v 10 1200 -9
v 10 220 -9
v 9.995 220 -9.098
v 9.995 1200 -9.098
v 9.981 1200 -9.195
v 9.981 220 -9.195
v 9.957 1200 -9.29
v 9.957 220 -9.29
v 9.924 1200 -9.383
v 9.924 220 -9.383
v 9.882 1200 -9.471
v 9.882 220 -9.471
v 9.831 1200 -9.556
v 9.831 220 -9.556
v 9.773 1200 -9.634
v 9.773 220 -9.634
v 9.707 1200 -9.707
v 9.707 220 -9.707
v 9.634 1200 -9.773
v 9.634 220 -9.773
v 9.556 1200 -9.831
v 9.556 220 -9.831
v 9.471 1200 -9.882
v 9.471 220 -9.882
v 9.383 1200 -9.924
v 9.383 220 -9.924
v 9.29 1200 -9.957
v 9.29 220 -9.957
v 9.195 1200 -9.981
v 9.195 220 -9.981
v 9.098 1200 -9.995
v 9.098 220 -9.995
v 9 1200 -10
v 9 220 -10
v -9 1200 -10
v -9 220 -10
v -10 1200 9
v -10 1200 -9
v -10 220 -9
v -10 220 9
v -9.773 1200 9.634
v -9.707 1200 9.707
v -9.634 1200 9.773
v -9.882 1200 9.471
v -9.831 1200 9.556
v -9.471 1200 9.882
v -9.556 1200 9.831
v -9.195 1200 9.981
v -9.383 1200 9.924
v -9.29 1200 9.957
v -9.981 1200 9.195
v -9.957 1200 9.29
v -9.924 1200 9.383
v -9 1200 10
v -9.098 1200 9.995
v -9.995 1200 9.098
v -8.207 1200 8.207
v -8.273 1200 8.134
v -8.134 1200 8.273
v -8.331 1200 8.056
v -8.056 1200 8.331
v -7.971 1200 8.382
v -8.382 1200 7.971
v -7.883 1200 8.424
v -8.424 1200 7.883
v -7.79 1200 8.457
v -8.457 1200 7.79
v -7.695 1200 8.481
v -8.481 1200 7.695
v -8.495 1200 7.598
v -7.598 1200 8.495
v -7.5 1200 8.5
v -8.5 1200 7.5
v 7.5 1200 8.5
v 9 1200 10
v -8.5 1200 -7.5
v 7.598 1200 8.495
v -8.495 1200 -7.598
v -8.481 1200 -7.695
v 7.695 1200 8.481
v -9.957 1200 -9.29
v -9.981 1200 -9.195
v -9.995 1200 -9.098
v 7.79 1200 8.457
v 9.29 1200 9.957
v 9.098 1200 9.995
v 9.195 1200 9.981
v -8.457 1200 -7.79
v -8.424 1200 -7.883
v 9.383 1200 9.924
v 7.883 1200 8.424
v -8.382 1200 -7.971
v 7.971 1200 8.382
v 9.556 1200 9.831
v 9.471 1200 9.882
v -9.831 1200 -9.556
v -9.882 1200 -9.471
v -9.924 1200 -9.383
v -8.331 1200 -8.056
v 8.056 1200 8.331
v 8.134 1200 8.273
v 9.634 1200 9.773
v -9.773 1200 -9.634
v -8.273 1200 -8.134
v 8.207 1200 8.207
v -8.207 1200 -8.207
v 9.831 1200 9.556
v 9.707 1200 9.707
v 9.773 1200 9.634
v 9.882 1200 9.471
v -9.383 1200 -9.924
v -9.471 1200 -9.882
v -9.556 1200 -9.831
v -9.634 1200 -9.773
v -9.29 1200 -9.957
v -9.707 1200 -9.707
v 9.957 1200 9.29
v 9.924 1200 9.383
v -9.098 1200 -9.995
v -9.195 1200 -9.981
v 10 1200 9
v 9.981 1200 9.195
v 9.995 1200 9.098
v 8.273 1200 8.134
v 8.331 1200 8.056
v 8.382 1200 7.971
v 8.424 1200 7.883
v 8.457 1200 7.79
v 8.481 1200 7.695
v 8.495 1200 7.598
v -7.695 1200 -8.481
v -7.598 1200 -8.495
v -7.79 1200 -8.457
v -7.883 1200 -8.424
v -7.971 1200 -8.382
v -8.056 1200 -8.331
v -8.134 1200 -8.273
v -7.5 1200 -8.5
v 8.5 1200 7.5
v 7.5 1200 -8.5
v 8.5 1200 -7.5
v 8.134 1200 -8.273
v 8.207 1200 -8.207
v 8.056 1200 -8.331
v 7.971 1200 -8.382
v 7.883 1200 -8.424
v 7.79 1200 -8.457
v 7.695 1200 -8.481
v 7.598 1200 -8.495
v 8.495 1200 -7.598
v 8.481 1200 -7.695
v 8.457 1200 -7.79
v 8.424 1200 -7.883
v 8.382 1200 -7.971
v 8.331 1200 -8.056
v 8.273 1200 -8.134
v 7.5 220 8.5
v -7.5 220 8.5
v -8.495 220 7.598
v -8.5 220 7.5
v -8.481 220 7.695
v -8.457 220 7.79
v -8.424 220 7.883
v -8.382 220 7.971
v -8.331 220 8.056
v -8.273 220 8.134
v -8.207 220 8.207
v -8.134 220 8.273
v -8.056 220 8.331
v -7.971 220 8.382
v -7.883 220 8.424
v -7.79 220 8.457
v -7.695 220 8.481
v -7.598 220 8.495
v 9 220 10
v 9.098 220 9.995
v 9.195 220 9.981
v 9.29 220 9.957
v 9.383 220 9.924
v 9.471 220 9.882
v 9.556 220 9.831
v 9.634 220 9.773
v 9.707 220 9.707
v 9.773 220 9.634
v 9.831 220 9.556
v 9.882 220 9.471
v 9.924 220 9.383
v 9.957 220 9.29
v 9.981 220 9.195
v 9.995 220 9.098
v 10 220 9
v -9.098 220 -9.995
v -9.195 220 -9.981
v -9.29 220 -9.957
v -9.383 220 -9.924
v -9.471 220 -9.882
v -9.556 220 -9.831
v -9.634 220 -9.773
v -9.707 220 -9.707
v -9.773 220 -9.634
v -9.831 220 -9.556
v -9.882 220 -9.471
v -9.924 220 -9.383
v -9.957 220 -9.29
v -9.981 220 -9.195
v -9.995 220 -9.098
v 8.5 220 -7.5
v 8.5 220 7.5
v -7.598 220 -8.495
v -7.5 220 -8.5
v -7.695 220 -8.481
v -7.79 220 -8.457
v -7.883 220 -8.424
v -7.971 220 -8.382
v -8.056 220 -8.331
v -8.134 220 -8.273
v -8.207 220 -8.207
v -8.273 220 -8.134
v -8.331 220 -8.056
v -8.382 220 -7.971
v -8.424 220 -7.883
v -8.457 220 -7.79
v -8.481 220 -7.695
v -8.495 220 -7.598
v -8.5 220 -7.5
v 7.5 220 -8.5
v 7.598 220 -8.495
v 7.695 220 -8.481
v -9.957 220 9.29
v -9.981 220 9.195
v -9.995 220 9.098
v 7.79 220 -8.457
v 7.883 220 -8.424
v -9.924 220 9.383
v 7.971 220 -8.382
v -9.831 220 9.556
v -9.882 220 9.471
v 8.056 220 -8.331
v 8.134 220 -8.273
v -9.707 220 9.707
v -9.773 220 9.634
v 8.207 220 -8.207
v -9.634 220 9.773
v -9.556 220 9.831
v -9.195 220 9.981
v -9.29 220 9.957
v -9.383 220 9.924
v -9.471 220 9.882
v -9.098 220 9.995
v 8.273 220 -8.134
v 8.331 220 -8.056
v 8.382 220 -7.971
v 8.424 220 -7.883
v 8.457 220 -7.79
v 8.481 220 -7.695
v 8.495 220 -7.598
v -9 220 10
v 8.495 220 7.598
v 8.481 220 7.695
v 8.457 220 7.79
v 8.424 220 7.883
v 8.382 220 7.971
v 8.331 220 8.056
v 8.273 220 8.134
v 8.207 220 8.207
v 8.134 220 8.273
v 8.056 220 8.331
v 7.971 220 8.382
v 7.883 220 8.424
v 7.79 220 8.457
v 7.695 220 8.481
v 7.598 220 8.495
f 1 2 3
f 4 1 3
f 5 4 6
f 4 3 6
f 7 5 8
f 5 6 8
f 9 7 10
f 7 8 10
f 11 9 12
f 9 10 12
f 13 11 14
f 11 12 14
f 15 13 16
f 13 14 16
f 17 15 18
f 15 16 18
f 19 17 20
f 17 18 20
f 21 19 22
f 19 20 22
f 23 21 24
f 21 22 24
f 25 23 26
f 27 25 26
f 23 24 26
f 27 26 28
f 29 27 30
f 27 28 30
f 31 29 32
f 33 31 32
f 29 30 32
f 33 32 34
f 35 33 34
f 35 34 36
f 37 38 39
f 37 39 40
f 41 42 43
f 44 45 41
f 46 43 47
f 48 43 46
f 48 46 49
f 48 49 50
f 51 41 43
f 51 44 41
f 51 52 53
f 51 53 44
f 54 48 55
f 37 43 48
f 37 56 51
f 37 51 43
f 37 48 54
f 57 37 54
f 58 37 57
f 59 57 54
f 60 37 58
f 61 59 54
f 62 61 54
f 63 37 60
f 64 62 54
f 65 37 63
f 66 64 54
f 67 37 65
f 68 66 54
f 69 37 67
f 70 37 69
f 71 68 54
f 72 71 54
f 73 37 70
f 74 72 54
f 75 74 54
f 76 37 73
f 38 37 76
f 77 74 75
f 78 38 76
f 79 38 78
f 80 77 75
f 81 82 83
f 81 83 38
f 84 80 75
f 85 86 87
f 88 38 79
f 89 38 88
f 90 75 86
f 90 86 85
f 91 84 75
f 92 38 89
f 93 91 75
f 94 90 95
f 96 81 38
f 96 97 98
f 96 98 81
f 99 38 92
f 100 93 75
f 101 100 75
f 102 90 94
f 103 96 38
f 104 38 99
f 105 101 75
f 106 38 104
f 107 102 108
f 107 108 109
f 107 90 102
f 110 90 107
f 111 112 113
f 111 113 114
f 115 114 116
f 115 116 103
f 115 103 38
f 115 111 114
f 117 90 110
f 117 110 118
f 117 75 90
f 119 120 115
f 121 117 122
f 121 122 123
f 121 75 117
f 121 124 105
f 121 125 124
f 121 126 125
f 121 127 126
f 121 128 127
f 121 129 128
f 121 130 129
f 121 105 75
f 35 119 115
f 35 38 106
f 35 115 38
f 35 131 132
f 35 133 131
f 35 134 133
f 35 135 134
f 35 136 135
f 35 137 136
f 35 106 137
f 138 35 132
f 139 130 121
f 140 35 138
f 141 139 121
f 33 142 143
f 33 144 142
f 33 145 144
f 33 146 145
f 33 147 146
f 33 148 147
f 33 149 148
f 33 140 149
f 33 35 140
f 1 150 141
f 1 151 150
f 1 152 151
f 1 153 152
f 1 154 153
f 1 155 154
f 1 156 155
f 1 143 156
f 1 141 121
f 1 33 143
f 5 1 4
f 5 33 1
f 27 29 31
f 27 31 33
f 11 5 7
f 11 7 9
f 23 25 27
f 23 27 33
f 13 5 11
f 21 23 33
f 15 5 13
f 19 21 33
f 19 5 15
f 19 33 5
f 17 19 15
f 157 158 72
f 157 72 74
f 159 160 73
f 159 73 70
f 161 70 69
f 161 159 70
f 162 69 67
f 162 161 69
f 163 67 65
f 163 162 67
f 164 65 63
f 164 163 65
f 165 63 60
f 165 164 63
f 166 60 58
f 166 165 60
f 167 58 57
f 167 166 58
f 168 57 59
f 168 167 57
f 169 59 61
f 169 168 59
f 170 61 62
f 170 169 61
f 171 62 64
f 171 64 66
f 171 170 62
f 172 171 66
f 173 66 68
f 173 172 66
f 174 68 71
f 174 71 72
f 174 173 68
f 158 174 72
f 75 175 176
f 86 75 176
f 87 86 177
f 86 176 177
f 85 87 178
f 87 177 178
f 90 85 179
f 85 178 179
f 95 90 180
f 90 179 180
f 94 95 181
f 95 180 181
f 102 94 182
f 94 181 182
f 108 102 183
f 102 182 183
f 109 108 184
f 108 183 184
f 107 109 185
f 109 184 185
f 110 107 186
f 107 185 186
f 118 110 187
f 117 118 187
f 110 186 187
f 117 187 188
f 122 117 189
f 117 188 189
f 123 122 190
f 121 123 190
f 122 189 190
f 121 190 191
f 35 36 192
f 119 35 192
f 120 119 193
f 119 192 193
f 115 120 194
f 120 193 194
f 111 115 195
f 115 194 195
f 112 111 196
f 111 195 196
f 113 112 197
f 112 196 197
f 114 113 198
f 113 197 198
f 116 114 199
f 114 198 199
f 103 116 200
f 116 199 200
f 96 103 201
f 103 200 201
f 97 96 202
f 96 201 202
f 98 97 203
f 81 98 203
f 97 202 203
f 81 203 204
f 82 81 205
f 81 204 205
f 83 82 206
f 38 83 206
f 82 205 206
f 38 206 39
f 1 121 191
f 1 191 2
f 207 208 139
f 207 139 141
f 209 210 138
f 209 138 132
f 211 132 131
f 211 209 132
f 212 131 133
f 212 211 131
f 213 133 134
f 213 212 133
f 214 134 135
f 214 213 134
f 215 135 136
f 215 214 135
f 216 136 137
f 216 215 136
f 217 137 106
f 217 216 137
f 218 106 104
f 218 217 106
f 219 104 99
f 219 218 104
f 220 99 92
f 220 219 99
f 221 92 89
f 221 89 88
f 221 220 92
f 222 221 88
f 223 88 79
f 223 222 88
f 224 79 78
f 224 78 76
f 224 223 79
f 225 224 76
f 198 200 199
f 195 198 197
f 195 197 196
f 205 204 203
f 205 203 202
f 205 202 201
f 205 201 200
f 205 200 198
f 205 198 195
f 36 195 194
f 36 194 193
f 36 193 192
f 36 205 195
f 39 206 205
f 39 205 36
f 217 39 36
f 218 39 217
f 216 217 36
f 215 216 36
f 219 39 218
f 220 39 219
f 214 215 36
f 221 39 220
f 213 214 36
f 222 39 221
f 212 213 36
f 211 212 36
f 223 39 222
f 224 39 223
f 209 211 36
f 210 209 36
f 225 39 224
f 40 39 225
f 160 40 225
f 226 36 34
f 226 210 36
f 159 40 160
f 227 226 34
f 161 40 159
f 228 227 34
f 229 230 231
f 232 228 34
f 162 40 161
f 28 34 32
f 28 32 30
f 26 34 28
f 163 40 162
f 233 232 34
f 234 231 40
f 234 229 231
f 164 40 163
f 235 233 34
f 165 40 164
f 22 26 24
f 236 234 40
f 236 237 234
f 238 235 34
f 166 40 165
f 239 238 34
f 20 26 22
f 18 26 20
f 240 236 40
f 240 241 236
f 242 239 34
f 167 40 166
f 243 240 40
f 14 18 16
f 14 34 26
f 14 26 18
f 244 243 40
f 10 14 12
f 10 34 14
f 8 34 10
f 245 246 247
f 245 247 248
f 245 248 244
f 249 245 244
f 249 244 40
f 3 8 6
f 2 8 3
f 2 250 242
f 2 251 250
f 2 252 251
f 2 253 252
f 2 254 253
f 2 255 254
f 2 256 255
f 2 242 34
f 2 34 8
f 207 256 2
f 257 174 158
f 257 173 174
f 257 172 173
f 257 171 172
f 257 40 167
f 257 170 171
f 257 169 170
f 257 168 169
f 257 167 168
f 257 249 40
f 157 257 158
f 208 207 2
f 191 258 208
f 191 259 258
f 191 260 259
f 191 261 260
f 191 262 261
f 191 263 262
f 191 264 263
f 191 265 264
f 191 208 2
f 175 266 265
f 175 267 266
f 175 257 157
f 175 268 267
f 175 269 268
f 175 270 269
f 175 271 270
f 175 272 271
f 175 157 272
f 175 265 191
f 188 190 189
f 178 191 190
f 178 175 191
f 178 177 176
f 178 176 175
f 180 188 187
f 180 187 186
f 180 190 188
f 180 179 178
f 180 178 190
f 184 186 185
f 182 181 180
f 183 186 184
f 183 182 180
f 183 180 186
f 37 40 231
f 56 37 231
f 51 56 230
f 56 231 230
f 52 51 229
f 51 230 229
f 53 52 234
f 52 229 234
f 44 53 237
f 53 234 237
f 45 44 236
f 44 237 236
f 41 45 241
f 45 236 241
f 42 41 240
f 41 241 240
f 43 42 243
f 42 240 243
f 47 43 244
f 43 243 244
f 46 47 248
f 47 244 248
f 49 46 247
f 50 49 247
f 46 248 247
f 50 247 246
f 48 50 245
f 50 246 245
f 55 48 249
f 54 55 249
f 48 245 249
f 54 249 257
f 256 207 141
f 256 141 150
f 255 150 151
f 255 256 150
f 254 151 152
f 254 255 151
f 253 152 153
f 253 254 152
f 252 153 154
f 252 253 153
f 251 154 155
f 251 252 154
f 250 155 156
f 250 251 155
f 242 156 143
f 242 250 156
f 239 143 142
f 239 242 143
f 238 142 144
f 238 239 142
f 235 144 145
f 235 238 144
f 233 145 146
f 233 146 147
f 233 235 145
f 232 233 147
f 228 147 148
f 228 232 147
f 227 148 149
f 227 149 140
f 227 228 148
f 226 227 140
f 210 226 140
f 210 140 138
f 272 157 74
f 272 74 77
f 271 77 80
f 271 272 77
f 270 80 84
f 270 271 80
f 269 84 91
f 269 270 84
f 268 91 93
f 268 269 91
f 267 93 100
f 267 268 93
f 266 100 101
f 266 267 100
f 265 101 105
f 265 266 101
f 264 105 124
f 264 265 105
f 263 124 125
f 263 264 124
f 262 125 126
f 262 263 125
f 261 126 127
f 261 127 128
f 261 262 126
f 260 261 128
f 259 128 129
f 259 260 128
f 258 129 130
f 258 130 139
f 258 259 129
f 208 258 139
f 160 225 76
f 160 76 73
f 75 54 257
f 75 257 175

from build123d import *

# Parameters (mm, degrees)
BOSS_EXTRUDE1_DEPTH = 1200
SKETCH2_W           = 101.895059676
SKETCH2_H           = 138.127514373
CUT_EXTRUDE1_DEPTH  = 220


with BuildPart() as part:
    # Sketch1 → Boss-Extrude1 (new body)
    with BuildSketch(Plane(origin=(0, 0, 0), x_dir=(1, 0, 0), z_dir=(0, 1, 0))):
        with BuildLine():
            Line((-9, -10), (9, -10))
            ThreePointArc((9, -10), (9.707106781, -9.707106781), (10, -9))
            Line((10, -9), (10, 9))
            ThreePointArc((10, 9), (9.707106781, 9.707106781), (9, 10))
            Line((9, 10), (-9, 10))
            ThreePointArc((-9, 10), (-9.707106781, 9.707106781), (-10, 9))
            Line((-10, 9), (-10, -9))
            ThreePointArc((-10, -9), (-9.707106781, -9.707106781), (-9, -10))
        make_face()
        with BuildLine():
            Line((-7.5, -8.5), (7.5, -8.5))
            ThreePointArc((7.5, -8.5), (8.207106781, -8.207106781), (8.5, -7.5))
            Line((8.5, -7.5), (8.5, 7.5))
            ThreePointArc((8.5, 7.5), (8.207106781, 8.207106781), (7.5, 8.5))
            Line((7.5, 8.5), (-7.5, 8.5))
            ThreePointArc((-7.5, 8.5), (-8.207106781, 8.207106781), (-8.5, 7.5))
            Line((-8.5, 7.5), (-8.5, -7.5))
            ThreePointArc((-8.5, -7.5), (-8.207106781, -8.207106781), (-7.5, -8.5))
        make_face(mode=Mode.SUBTRACT)
    extrude(amount=BOSS_EXTRUDE1_DEPTH)

    # Sketch2 → Cut-Extrude1 (cut)
    with BuildSketch(Plane.XZ):
        with Locations((4.315799724, -16.6218454)):
            Rectangle(SKETCH2_W, SKETCH2_H)
    extrude(amount=-CUT_EXTRUDE1_DEPTH, mode=Mode.SUBTRACT)


solid = part.part
